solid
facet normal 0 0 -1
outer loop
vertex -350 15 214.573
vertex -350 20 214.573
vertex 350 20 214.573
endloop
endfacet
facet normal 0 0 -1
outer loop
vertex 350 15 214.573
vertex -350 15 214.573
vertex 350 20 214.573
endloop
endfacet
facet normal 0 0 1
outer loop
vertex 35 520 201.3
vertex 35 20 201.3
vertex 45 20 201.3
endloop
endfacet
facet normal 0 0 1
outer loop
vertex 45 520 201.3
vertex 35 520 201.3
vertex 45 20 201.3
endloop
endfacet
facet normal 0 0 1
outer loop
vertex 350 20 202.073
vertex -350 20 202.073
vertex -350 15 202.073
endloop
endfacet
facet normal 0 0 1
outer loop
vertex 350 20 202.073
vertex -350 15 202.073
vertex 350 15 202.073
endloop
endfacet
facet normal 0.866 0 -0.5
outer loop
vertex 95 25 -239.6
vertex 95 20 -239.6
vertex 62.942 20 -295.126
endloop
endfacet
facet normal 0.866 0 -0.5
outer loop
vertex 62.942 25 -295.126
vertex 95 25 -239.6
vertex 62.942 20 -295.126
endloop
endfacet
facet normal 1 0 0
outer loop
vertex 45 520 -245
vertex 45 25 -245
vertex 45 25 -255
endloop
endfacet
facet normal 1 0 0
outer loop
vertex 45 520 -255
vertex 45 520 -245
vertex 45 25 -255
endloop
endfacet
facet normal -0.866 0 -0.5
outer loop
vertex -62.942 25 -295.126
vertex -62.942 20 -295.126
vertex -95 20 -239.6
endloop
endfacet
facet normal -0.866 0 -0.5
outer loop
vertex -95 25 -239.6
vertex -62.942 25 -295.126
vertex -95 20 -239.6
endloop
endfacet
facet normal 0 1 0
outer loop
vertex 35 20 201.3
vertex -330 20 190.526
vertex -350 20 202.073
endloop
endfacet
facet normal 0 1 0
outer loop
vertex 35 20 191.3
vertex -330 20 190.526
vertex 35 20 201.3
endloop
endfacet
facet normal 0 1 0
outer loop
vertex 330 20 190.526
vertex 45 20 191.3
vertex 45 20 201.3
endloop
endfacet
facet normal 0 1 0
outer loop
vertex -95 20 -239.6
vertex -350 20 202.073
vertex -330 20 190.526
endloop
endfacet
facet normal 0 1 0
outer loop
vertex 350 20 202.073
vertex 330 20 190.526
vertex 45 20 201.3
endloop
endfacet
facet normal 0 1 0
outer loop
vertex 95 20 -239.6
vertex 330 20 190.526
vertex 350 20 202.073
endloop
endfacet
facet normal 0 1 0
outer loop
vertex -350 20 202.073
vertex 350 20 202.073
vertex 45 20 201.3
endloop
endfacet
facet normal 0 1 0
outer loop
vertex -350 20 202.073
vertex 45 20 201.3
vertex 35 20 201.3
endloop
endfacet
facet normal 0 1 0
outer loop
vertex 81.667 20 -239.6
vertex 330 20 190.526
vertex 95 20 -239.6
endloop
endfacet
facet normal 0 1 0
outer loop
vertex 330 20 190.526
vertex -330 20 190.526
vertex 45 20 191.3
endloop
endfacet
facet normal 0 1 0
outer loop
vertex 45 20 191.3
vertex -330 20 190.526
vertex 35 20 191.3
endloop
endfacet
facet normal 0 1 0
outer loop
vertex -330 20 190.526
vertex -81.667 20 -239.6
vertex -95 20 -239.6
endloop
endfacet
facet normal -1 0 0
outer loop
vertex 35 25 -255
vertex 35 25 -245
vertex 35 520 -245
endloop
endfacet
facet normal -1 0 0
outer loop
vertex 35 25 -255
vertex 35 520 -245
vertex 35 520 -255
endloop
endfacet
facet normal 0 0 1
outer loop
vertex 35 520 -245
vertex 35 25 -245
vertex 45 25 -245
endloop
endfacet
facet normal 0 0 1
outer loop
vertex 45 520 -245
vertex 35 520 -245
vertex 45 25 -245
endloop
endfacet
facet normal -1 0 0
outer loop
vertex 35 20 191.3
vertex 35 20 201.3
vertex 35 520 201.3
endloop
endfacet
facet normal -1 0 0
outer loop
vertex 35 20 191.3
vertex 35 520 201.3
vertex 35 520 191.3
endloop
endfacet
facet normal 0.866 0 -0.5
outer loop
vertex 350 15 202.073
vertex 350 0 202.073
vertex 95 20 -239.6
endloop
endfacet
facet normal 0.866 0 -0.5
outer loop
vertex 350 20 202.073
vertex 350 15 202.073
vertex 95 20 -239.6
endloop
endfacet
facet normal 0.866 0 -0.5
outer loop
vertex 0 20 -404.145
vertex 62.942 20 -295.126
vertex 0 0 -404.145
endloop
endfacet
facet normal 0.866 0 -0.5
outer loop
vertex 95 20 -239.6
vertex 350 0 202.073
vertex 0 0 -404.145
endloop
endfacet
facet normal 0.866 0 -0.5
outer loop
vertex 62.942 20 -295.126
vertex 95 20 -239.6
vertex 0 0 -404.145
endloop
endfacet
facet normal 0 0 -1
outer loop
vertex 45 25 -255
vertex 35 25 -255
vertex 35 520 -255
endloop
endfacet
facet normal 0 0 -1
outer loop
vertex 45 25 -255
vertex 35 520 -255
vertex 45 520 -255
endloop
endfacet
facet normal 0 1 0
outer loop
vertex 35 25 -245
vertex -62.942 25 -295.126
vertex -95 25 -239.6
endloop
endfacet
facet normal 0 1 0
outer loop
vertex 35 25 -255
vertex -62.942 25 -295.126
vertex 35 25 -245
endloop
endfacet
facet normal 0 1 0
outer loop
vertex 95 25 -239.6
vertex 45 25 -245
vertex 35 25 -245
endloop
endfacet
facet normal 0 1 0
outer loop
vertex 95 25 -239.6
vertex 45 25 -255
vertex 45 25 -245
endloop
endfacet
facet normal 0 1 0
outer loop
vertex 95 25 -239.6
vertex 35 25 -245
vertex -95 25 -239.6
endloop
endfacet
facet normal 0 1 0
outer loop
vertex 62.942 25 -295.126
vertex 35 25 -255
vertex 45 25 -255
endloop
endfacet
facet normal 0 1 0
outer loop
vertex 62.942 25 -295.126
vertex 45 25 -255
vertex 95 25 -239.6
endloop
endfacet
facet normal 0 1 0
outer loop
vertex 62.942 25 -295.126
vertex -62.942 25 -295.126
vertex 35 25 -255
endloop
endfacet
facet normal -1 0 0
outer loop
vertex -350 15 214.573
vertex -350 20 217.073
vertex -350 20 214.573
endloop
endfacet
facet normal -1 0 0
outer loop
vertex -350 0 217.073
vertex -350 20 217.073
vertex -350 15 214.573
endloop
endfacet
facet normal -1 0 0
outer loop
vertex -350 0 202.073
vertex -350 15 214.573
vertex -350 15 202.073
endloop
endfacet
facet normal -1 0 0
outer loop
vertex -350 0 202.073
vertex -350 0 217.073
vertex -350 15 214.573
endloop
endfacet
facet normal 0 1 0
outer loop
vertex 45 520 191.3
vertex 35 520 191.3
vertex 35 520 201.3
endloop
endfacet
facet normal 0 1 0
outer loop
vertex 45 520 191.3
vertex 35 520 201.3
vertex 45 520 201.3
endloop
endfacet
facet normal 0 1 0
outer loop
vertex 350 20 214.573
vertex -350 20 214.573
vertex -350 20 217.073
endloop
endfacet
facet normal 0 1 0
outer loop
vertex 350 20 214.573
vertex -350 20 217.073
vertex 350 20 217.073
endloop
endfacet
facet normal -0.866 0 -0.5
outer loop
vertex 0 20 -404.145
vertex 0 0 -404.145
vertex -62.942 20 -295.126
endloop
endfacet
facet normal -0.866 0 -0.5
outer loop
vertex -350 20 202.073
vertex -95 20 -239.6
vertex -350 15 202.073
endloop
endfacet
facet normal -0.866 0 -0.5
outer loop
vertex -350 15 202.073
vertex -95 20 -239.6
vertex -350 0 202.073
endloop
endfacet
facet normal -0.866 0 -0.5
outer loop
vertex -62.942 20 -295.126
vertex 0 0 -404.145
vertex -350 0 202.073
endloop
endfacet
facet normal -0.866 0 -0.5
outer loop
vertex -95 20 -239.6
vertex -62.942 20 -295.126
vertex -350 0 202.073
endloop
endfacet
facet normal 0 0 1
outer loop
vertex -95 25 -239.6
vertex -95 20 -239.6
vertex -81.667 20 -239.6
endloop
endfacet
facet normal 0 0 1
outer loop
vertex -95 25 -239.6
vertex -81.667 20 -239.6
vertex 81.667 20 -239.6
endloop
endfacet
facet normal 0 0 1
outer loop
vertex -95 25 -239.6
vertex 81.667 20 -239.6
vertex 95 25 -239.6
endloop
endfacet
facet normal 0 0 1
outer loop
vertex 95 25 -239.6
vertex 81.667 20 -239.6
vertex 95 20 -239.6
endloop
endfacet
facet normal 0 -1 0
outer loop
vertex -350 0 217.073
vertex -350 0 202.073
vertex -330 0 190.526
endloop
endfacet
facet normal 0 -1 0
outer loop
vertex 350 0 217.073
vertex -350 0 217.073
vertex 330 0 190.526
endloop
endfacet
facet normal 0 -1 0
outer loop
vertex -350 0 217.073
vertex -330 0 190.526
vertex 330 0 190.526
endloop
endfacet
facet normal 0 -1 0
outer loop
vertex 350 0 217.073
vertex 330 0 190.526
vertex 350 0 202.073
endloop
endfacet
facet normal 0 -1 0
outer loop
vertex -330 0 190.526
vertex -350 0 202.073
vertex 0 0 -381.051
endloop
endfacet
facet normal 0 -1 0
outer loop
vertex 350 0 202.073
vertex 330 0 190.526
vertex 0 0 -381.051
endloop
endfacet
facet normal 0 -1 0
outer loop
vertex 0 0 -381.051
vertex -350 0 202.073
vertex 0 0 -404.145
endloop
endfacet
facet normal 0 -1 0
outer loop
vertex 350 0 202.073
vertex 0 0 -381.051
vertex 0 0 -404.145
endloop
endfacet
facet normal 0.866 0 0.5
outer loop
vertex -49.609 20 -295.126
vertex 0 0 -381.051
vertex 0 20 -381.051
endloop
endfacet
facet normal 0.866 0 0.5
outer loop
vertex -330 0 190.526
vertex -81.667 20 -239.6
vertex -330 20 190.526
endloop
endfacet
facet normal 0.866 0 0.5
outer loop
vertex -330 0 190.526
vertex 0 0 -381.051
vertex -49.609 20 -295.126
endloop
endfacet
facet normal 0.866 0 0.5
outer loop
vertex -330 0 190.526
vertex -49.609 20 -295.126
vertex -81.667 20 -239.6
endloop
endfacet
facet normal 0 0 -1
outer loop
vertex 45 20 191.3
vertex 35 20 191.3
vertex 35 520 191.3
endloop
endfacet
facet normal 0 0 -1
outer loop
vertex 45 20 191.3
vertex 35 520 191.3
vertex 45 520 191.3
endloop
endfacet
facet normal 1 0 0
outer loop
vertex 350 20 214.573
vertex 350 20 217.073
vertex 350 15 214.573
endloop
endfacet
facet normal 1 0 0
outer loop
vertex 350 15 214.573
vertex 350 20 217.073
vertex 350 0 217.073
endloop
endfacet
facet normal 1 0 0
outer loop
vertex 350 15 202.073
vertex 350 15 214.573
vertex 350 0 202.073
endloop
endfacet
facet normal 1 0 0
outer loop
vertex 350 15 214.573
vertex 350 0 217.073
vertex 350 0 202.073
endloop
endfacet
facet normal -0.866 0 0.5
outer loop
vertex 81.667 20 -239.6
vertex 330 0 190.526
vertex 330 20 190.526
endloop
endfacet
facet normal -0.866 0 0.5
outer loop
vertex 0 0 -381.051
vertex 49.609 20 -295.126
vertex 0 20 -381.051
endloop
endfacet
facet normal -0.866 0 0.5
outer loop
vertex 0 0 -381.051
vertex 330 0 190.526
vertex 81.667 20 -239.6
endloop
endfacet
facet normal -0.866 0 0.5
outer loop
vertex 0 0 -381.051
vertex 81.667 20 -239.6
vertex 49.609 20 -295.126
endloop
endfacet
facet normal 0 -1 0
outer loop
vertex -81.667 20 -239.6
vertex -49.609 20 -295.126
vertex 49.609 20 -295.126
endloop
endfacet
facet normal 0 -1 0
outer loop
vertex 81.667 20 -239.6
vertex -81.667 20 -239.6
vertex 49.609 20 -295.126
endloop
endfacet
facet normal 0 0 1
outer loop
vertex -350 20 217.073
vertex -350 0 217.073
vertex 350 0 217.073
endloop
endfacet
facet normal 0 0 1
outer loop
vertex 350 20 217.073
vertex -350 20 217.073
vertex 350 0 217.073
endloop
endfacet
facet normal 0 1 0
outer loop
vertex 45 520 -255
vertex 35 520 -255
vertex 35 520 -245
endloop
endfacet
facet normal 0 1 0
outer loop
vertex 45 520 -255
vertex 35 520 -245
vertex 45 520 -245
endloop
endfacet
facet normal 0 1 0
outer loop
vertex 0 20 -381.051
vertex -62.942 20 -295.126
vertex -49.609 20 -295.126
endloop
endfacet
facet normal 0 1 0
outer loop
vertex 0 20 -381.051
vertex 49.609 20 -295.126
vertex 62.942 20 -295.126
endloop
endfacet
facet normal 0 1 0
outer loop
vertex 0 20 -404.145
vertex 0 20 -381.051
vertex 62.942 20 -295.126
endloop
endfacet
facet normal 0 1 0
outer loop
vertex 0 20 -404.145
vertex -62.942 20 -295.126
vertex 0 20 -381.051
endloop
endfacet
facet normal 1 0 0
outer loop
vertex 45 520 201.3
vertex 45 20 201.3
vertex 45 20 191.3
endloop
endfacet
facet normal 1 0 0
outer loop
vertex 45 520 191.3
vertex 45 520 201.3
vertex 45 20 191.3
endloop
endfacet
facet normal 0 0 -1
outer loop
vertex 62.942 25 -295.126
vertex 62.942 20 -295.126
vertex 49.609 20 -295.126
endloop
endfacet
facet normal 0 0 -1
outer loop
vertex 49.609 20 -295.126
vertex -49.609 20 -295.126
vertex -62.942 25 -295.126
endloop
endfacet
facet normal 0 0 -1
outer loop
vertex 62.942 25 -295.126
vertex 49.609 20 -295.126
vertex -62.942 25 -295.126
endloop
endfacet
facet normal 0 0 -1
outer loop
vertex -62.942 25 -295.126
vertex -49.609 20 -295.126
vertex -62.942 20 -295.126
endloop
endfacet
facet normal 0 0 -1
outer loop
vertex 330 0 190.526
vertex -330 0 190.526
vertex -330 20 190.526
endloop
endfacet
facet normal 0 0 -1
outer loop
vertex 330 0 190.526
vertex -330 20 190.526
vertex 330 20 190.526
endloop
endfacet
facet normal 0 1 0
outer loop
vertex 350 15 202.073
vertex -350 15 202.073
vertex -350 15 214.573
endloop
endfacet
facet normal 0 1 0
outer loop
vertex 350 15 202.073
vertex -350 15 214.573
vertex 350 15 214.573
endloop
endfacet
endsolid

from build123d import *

# Parameters (mm, degrees)
BOSS_EXTRUDE1_DEPTH = 20
SKETCH2_W           = 700
SKETCH2_H           = 15
BOSS_EXTRUDE2_DEPTH = 20
SKETCH6_W           = 10
SKETCH6_H           = 10
BOSS_EXTRUDE3_DEPTH = 500
BOSS_EXTRUDE4_DEPTH = 5
SKETCH8_W           = 10
SKETCH8_H           = 10
BOSS_EXTRUDE5_DEPTH = 495
SKETCH4_W           = 700
SKETCH4_H           = 12.5
CUT_EXTRUDE2_DEPTH  = 5


with BuildPart() as part:
    # Sketch1 → Boss-Extrude1 (new body)
    with BuildSketch(Plane(origin=(0, 0, 0), x_dir=(1, 0, 0), z_dir=(0, 1, 0))):
        Polygon((0, 404.145188433), (-350, -202.072594216), (350, -202.072594216), align=None)
        Polygon((0, 381.051177665), (-330, -190.525588833), (330, -190.525588833), align=None, mode=Mode.SUBTRACT)
    extrude(amount=BOSS_EXTRUDE1_DEPTH)

    # Sketch2 → Boss-Extrude2 (add)
    with BuildSketch(Plane(origin=(0, 0, 0), x_dir=(1, 0, 0), z_dir=(0, 1, 0))):
        with Locations((0, -209.572594216)):
            Rectangle(SKETCH2_W, SKETCH2_H)
    extrude(amount=BOSS_EXTRUDE2_DEPTH)

    # Sketch6 → Boss-Extrude3 (add)
    with BuildSketch(Plane(origin=(0, 20, 0), x_dir=(1, 0, 0), z_dir=(0, 1, 0))):
        with Locations((40, -196.3)):
            Rectangle(SKETCH6_W, SKETCH6_H)
    extrude(amount=BOSS_EXTRUDE3_DEPTH)

    # Sketch7 → Boss-Extrude4 (add)
    with BuildSketch(Plane(origin=(0, 20, 0), x_dir=(1, 0, 0), z_dir=(0, 1, 0))):
        Polygon((62.94207364, 295.126318955), (-62.94207364, 295.126318955), (-95, 239.600361714), (95, 239.600361714), align=None)
    extrude(amount=BOSS_EXTRUDE4_DEPTH)

    # Sketch8 → Boss-Extrude5 (add)
    with BuildSketch(Plane(origin=(0, 25, 0), x_dir=(1, 0, 0), z_dir=(0, 1, 0))):
        with Locations((40, 250)):
            Rectangle(SKETCH8_W, SKETCH8_H)
    extrude(amount=BOSS_EXTRUDE5_DEPTH)

    # Sketch4 → Cut-Extrude2 (cut)
    with BuildSketch(Plane(origin=(0, 20, 0), x_dir=(1, 0, 0), z_dir=(0, 1, 0))):
        with Locations((0, -208.322594216)):
            Rectangle(SKETCH4_W, SKETCH4_H)
    extrude(amount=-CUT_EXTRUDE2_DEPTH, mode=Mode.SUBTRACT)


solid = part.part
